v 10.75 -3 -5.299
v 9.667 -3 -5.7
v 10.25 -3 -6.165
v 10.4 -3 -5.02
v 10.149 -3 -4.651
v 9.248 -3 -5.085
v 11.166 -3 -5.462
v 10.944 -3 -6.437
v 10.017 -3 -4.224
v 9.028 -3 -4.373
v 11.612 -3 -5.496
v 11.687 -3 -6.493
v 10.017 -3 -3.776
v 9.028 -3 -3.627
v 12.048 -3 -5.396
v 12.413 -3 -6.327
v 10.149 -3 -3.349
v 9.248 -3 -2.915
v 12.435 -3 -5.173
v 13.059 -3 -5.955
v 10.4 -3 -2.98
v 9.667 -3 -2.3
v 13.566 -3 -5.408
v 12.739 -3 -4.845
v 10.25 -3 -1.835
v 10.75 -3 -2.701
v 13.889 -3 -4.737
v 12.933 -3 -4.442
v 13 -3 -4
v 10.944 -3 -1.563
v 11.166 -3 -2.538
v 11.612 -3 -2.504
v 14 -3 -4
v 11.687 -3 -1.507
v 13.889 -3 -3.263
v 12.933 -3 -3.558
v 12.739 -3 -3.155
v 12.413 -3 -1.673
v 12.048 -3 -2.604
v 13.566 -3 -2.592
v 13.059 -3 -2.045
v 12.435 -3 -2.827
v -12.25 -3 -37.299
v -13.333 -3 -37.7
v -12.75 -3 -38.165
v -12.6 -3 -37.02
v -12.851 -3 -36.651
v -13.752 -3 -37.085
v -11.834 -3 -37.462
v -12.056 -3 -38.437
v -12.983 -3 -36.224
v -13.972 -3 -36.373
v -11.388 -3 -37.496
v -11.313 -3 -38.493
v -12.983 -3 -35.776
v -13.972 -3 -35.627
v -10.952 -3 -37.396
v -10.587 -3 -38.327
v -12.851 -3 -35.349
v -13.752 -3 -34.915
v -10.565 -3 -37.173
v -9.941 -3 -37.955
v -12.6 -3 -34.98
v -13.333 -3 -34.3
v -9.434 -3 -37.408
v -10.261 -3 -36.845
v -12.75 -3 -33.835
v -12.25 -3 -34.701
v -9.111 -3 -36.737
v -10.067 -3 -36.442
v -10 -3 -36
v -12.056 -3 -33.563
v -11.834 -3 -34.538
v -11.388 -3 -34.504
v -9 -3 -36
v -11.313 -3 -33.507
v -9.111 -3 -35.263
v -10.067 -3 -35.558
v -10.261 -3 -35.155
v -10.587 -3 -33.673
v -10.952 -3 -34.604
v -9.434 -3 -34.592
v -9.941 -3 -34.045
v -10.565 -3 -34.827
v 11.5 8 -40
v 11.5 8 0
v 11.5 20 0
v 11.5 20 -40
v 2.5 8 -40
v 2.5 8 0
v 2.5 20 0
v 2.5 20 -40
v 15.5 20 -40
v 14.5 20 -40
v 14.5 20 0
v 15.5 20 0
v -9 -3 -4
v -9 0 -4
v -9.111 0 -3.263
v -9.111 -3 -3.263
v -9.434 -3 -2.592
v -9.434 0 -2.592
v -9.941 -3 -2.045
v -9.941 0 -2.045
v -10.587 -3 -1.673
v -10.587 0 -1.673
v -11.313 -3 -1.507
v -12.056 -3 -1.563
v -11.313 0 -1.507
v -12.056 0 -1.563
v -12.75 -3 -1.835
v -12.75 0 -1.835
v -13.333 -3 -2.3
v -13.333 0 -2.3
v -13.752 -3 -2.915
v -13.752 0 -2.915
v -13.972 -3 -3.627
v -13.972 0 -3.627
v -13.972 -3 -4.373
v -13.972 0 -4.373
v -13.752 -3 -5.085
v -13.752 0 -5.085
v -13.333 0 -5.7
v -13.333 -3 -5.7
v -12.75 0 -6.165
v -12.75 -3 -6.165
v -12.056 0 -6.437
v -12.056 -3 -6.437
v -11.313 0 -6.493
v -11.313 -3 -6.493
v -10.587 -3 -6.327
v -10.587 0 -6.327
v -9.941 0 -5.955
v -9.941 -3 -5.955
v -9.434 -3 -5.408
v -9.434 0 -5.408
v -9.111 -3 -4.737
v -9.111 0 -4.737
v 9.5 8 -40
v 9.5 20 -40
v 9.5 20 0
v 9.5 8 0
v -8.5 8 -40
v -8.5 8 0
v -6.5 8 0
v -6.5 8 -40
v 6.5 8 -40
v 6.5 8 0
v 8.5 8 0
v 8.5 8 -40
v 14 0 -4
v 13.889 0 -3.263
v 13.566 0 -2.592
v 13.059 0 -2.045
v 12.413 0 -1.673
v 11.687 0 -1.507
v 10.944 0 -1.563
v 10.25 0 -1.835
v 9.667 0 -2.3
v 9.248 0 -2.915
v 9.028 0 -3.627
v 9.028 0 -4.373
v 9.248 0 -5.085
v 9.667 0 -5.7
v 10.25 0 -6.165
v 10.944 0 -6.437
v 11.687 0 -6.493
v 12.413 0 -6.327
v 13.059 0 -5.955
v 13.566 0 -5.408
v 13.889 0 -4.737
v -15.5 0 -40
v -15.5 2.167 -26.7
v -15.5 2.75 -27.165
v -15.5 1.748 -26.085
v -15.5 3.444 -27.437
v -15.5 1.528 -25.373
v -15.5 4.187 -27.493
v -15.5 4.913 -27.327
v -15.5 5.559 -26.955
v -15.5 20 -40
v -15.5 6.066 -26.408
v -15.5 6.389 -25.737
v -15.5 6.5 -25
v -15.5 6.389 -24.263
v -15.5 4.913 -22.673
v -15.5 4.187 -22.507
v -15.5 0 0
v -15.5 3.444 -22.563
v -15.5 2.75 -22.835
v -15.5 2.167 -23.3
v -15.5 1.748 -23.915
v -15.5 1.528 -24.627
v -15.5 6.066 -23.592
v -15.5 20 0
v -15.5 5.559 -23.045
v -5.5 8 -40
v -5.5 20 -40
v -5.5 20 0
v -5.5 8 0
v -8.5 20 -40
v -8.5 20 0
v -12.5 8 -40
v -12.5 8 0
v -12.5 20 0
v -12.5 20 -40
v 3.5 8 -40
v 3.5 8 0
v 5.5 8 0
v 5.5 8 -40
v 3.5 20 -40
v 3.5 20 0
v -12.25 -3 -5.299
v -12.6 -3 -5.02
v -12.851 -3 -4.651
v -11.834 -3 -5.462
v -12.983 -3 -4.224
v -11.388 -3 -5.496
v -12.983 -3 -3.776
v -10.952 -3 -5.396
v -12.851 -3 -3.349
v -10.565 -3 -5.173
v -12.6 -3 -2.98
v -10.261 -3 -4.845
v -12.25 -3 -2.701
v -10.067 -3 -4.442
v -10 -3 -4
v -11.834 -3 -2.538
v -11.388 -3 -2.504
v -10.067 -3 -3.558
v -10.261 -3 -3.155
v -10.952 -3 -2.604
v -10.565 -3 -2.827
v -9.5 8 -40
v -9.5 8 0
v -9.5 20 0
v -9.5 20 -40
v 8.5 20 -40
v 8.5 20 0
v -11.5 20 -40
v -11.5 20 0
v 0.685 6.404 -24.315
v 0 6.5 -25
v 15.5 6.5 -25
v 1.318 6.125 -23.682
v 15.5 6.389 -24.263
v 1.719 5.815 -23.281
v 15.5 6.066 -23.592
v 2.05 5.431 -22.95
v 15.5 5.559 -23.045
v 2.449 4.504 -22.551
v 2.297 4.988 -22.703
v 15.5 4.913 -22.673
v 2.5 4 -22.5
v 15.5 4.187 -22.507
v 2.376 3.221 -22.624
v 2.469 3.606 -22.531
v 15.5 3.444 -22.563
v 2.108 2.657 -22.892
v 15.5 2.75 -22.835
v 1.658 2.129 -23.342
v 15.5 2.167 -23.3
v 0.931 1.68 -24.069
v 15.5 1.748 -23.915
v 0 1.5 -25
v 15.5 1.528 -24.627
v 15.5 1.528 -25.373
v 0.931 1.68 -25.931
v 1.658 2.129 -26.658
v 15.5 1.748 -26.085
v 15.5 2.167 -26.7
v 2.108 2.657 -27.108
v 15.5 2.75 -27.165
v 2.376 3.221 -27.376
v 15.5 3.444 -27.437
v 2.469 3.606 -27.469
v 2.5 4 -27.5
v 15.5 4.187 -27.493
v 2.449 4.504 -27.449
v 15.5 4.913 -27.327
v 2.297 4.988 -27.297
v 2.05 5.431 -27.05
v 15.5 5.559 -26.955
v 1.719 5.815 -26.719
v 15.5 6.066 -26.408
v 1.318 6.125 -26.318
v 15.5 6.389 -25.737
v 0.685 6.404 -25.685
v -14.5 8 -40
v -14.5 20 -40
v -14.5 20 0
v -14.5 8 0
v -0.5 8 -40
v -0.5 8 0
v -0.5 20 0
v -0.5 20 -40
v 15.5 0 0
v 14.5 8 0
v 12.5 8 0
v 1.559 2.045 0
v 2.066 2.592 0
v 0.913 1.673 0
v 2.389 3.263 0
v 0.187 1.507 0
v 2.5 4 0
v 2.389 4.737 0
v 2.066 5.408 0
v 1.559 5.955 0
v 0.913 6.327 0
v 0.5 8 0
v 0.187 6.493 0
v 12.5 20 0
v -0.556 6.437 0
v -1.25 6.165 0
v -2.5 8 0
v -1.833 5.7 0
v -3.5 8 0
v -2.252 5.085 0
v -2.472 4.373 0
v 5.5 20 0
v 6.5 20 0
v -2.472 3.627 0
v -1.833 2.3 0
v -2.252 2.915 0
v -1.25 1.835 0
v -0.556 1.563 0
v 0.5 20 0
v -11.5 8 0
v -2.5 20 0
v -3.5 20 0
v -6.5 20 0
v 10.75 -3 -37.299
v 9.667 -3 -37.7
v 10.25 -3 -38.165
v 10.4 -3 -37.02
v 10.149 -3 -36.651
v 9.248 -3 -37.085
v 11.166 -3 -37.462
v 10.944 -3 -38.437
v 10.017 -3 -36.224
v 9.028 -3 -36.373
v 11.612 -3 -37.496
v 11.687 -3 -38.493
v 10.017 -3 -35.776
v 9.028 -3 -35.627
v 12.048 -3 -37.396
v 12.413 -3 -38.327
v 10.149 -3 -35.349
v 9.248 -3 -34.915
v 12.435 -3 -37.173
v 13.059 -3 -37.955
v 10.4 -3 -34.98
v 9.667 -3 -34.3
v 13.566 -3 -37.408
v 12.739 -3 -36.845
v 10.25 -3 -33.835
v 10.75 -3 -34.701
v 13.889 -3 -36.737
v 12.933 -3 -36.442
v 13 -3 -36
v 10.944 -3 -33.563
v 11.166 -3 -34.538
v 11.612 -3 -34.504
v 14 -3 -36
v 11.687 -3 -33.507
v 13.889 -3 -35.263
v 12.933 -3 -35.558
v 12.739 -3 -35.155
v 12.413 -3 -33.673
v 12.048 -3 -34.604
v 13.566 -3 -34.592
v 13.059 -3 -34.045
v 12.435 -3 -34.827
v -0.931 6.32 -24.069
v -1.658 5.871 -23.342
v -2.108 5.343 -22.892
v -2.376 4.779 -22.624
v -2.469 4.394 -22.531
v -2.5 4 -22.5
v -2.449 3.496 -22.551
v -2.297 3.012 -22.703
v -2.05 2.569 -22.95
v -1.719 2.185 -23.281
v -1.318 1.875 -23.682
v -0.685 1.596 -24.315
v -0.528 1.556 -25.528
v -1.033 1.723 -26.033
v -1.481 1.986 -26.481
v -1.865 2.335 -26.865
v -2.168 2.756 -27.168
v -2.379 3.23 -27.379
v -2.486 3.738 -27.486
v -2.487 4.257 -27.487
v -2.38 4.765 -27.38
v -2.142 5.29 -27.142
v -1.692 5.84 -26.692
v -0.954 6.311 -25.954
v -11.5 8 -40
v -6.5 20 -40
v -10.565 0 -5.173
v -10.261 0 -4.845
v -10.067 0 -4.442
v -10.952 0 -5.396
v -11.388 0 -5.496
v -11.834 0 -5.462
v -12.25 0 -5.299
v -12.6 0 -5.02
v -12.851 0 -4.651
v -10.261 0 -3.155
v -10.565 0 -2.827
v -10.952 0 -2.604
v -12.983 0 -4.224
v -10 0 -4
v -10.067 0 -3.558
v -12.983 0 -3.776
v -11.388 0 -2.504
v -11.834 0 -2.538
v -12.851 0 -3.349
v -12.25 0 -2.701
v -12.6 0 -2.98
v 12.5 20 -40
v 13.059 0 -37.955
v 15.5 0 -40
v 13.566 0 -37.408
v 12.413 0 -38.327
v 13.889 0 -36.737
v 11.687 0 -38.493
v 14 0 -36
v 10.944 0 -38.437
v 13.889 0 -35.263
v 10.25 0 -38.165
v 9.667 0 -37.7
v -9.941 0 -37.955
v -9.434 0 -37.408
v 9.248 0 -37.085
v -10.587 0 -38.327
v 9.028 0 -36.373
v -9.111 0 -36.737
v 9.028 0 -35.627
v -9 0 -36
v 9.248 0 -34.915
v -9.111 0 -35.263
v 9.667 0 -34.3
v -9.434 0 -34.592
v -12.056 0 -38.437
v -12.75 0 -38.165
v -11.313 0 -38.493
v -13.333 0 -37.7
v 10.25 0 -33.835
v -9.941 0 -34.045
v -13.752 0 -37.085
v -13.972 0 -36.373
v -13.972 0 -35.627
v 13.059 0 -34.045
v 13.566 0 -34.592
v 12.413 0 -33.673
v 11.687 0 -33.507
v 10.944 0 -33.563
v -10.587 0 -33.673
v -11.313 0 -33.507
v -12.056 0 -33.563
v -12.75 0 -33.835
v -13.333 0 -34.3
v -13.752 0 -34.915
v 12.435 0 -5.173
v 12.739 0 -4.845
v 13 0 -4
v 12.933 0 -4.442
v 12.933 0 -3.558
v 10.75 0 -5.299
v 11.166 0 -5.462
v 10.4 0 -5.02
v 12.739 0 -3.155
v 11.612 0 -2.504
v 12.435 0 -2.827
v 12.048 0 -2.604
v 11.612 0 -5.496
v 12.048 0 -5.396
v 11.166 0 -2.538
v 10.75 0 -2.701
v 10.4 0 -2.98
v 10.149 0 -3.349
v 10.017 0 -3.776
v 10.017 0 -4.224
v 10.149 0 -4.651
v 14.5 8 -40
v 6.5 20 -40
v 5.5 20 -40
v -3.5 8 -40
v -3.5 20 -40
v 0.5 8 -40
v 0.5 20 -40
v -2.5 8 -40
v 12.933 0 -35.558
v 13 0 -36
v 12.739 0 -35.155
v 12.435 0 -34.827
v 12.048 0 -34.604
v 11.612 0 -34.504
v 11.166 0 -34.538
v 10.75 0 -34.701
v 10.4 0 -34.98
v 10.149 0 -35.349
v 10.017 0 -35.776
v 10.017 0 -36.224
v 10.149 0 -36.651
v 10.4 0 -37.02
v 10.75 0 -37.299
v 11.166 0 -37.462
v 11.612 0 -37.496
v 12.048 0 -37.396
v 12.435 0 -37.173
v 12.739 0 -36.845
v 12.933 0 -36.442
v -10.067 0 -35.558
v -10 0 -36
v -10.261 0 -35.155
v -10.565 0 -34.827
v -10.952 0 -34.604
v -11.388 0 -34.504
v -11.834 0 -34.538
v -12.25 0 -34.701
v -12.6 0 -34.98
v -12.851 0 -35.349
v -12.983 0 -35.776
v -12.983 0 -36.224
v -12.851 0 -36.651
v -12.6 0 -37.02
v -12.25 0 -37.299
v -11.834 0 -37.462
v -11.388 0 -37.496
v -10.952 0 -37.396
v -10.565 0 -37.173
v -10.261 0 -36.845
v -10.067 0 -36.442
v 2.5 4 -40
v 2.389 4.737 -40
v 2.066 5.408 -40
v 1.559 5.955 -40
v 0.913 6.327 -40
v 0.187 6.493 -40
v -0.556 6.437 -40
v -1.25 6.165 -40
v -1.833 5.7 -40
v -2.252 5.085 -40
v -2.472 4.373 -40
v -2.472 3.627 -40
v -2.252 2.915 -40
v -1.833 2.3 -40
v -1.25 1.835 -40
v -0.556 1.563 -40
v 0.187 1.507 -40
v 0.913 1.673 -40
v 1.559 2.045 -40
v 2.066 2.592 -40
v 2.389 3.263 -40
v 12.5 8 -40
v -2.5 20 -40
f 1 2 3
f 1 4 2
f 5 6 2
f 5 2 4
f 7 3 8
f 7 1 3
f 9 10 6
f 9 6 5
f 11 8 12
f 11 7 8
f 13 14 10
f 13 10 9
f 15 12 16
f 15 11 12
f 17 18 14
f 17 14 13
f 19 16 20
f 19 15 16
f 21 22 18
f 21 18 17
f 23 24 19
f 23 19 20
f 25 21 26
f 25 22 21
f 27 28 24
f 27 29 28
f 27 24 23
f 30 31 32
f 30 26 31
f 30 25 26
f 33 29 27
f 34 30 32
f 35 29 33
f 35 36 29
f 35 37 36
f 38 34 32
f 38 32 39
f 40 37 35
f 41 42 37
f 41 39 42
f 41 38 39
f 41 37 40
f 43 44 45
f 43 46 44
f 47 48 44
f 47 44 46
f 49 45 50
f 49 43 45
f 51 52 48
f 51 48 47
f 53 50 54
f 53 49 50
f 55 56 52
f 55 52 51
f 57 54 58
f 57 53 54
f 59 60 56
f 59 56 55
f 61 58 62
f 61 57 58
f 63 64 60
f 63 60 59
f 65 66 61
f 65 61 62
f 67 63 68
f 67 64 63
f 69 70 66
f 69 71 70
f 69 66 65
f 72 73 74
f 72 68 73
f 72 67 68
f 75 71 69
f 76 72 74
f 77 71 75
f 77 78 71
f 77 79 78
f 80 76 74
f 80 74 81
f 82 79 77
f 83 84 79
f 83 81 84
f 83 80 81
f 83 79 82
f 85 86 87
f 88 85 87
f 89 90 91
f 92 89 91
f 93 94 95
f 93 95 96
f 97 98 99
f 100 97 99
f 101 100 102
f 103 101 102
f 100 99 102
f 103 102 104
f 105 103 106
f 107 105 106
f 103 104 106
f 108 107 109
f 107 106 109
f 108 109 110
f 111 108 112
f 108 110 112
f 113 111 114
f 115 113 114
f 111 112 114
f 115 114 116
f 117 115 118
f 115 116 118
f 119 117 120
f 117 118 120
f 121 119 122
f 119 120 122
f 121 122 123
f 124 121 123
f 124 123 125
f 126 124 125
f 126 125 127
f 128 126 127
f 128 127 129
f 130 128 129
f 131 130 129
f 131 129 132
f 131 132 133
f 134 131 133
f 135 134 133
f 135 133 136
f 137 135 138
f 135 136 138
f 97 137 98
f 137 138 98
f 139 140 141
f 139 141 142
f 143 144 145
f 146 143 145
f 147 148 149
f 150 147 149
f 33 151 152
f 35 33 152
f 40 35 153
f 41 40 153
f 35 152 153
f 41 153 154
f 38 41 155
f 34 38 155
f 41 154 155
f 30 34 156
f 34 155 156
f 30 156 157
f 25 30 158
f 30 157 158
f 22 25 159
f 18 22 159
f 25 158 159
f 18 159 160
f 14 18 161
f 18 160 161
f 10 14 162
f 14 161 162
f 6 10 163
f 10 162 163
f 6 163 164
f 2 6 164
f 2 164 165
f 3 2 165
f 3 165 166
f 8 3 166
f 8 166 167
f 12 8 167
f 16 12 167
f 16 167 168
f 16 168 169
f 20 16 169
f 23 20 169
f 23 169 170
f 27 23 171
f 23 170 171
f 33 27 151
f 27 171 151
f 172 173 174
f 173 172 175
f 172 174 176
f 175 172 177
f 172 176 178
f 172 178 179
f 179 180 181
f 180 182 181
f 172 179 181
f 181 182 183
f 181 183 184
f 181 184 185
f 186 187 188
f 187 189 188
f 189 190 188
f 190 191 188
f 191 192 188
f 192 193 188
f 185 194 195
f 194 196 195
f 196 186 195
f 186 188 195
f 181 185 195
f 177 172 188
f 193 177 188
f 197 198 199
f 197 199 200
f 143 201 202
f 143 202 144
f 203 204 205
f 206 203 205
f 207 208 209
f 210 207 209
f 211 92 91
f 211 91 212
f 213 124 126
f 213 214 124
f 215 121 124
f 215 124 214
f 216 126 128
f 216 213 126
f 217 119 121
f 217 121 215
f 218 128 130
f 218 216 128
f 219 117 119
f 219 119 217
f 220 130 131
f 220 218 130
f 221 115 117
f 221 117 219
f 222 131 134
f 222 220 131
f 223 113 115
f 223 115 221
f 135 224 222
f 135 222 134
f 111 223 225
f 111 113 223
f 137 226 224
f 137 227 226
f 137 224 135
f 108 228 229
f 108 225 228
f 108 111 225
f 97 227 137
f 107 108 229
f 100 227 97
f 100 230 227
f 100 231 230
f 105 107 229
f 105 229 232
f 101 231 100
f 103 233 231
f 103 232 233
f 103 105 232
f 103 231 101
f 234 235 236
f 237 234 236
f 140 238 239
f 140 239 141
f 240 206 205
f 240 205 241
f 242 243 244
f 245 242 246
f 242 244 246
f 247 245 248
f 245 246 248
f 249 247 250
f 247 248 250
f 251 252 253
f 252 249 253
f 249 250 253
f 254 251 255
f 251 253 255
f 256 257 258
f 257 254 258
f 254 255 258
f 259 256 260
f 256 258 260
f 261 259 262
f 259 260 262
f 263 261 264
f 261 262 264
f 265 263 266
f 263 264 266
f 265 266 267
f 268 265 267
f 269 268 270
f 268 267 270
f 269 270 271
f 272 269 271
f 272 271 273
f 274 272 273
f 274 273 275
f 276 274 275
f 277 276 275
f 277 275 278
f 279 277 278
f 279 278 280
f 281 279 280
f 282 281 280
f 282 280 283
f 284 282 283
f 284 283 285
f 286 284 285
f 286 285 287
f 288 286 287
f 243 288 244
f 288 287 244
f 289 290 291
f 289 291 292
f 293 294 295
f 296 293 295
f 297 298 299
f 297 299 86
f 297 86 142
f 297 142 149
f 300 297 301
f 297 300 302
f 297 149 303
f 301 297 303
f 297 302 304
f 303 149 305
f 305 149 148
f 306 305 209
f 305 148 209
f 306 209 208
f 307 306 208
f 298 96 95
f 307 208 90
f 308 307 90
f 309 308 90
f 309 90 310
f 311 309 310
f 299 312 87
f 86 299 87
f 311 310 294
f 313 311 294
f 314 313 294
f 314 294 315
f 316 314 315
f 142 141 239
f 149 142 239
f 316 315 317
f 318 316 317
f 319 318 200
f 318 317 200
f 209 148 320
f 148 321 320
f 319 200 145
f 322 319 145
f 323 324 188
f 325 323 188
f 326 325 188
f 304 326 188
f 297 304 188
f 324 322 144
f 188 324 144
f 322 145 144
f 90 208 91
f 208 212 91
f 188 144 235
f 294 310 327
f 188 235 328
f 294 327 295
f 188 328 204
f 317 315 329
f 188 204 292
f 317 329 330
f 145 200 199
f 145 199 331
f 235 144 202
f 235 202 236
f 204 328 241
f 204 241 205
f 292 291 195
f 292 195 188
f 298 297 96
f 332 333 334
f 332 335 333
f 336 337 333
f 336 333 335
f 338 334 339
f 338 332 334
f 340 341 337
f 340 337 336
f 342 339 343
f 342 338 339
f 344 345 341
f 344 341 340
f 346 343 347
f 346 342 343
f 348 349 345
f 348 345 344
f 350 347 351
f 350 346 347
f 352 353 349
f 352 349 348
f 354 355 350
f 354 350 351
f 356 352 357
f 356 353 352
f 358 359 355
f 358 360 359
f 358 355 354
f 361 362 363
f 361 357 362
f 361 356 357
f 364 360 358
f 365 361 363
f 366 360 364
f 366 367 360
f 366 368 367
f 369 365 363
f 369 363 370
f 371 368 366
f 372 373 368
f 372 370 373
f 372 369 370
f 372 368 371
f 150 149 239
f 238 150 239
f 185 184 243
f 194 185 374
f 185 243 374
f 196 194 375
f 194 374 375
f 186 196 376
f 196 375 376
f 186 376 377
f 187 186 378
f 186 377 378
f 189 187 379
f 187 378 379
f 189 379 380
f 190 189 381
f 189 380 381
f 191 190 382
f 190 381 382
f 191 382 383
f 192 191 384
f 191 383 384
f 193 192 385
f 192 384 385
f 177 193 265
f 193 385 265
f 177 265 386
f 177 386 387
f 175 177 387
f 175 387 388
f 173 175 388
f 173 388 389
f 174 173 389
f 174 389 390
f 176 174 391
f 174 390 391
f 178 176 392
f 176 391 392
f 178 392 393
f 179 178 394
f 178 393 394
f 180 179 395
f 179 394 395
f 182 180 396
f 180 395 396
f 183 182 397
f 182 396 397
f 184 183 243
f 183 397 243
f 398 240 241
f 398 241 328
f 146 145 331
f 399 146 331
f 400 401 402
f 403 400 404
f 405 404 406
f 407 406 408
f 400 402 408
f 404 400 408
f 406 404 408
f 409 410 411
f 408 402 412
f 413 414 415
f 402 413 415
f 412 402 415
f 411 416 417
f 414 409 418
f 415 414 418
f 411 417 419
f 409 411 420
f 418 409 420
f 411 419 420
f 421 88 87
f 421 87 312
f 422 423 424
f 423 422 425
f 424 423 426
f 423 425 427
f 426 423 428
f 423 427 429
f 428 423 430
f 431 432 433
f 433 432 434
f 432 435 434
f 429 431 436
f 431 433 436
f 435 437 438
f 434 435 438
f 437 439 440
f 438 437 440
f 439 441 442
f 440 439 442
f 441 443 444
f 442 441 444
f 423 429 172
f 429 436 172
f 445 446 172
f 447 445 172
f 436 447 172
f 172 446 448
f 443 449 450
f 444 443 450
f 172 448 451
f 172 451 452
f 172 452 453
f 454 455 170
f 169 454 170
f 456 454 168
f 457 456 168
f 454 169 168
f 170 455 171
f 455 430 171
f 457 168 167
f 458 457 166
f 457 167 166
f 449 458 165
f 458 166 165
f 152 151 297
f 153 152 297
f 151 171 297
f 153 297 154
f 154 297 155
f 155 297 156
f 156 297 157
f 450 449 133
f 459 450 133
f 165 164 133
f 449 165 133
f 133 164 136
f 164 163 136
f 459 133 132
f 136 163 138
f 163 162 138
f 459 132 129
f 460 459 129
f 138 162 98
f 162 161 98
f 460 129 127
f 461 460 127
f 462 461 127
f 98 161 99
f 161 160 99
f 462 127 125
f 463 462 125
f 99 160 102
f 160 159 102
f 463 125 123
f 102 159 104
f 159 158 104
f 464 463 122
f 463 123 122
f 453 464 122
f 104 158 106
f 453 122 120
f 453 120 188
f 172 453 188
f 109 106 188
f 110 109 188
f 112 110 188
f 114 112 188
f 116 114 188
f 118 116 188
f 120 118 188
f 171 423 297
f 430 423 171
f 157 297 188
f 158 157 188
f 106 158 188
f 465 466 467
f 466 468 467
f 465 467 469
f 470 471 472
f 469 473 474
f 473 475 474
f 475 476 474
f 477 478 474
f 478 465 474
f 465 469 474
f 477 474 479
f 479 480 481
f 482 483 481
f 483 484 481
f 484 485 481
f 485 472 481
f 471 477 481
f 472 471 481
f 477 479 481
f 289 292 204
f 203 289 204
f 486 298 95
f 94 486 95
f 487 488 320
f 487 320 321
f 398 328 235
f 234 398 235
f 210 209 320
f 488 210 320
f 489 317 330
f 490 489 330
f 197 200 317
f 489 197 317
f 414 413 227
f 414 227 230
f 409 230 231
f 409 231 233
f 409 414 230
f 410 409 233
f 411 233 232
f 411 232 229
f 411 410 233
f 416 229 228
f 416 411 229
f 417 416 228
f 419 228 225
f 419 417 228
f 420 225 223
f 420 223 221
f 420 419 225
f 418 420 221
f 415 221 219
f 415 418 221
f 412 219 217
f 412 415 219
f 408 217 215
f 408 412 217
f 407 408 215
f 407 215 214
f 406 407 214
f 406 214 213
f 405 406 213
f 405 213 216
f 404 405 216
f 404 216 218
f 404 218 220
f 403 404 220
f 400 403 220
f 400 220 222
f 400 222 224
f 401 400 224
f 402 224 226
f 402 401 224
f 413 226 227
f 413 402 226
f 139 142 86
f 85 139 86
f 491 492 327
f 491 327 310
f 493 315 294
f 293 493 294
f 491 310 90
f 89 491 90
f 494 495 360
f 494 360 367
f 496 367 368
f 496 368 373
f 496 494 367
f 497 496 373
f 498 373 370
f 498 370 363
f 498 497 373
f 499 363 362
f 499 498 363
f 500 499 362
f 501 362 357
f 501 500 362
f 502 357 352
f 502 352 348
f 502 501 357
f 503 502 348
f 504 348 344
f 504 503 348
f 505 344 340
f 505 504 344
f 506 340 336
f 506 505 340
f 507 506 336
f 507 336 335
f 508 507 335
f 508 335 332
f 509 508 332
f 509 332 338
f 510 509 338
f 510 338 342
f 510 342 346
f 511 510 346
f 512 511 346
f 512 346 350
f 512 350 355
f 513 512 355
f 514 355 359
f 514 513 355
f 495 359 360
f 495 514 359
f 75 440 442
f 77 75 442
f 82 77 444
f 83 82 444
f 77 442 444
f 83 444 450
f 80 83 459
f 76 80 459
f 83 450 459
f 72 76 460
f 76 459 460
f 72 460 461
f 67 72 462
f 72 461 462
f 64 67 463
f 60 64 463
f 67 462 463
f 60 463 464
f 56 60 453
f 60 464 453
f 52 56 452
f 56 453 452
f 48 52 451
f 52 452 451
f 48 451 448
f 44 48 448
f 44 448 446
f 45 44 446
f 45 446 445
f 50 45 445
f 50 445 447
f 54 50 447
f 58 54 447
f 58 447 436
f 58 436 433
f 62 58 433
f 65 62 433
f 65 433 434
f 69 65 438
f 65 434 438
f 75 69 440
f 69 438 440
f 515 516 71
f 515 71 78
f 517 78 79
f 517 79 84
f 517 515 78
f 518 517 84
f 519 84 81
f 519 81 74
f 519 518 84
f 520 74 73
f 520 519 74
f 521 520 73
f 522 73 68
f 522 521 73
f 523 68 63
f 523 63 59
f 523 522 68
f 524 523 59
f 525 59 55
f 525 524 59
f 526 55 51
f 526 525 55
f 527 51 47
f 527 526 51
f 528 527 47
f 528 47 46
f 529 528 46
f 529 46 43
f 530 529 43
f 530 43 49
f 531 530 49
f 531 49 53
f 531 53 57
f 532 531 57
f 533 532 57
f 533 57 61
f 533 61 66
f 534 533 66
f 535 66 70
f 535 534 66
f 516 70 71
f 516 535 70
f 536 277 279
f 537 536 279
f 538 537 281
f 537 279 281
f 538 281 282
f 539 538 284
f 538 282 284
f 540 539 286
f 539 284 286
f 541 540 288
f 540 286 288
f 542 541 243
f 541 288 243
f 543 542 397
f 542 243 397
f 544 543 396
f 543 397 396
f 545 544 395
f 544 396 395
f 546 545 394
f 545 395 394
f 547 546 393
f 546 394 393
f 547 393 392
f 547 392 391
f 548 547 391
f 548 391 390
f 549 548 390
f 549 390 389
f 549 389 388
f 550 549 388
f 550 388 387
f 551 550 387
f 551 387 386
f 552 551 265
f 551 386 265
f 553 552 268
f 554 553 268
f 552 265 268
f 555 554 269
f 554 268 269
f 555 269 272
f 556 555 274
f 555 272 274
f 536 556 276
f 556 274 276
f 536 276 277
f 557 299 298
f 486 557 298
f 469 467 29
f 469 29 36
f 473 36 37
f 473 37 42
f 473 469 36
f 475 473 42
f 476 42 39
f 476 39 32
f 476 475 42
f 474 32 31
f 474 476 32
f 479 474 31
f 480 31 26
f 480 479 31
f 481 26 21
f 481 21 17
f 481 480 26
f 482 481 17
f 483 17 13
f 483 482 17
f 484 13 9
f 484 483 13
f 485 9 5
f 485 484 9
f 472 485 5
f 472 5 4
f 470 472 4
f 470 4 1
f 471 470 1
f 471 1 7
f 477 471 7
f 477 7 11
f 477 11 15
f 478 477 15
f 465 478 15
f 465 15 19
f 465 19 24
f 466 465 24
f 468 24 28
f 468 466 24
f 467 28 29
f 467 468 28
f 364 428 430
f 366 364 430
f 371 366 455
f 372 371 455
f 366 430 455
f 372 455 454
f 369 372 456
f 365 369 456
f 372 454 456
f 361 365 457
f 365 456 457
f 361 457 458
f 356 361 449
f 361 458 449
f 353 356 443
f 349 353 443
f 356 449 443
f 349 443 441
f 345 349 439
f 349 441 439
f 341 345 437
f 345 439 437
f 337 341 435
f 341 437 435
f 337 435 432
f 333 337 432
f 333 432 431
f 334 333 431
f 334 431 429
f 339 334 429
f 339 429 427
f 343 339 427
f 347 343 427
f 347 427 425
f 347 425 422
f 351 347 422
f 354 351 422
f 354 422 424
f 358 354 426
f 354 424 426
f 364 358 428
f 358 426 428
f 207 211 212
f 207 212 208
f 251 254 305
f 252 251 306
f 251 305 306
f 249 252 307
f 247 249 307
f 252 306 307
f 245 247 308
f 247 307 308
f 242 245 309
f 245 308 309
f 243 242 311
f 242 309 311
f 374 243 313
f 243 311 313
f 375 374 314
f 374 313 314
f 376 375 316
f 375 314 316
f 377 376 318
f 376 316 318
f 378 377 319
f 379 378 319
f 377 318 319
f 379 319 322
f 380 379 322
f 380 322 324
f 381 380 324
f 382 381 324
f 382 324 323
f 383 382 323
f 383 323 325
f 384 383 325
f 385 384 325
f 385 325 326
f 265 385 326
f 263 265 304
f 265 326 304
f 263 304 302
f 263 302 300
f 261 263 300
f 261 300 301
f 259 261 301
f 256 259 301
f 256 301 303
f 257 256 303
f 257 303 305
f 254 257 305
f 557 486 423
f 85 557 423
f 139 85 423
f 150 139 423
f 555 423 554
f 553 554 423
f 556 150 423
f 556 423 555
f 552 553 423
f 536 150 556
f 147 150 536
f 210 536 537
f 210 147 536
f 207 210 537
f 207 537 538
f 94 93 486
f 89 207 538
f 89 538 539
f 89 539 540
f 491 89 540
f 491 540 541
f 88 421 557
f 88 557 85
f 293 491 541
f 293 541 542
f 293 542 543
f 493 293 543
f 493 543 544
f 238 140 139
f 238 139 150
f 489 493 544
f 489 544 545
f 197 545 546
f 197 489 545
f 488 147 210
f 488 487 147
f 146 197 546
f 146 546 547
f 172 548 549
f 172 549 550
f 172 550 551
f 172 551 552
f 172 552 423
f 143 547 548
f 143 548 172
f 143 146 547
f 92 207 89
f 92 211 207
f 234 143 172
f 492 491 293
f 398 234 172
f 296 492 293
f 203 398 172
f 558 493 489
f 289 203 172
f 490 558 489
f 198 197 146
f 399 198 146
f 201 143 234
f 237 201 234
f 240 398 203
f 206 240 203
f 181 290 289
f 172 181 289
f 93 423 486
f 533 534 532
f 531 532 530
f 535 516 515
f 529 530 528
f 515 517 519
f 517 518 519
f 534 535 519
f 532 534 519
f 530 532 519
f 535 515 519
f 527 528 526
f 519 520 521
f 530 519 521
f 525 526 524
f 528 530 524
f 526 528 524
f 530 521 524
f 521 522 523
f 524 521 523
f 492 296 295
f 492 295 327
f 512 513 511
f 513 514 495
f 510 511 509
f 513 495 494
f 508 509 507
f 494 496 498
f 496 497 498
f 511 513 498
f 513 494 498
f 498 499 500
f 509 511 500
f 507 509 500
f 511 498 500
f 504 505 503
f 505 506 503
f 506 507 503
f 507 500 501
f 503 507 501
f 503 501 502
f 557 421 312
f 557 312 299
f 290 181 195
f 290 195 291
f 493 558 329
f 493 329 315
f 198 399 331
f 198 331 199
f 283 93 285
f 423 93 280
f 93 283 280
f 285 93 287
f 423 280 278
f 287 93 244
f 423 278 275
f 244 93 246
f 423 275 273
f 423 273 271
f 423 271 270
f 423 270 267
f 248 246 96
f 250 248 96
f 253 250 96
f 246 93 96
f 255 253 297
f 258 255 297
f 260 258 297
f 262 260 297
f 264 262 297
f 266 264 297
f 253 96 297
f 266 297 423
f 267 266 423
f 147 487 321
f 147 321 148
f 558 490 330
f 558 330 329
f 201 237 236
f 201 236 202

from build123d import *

# Parameters (mm, degrees)
EXTRUDE1_DEPTH       = 40
SKETCH2_R            = 2.5
EXTRUDE2_DEPTH       = 48.331279298
SKETCH3_R            = 2.5
EXTRUDE3_DEPTH       = 55.415071442
SKETCH4_R            = 2.5
SKETCH4_R_2          = 1.5
EXTRUDE4_DEPTH       = 3
LPATTERN6_COUNT      = 2
LPATTERN6_PITCH      = 23
LPATTERN6_COUNT_DIR2 = 2
LPATTERN6_PITCH_DIR2 = 32


with BuildPart() as part:
    # Sketch1 → Extrude1 (new body)
    with BuildSketch(Plane.XY):
        Polygon((-15.5, 0), (-15.5, 20), (-14.5, 20), (-14.5, 8), (-12.5, 8), (-12.5, 20), (-11.5, 20), (-11.5, 8), (-9.5, 8), (-9.5, 20), (-8.5, 20), (-8.5, 8), (-6.5, 8), (-6.5, 20), (-5.5, 20), (-5.5, 8), (-3.5, 8), (-3.5, 20), (-2.5, 20), (-2.5, 8), (-0.5, 8), (-0.5, 20), (0.5, 20), (0.5, 8), (2.5, 8), (2.5, 20), (3.5, 20), (3.5, 8), (5.5, 8), (5.5, 20), (6.5, 20), (6.5, 8), (8.5, 8), (8.5, 20), (9.5, 20), (9.5, 8), (11.5, 8), (11.5, 20), (12.5, 20), (12.5, 8), (14.5, 8), (14.5, 20), (15.5, 20), (15.5, 0), align=None)
    extrude(amount=-EXTRUDE1_DEPTH)

    # Sketch2 → Extrude2 (cut, through all)
    with BuildSketch(Plane.XY):
        with Locations((0, 4)):
            Circle(SKETCH2_R)
    extrude(amount=-EXTRUDE2_DEPTH, mode=Mode.SUBTRACT)

    # Sketch3 → Extrude3 (cut, through all)
    with BuildSketch(Plane(origin=(15.5, 0, 0), x_dir=(0, 0, -1), z_dir=(1, 0, 0))):
        with Locations(Location((25, 4, 0), (0, 0, 90))):
            Circle(SKETCH3_R)
    extrude(amount=-EXTRUDE3_DEPTH, mode=Mode.SUBTRACT)

    # Sketch4 → Extrude4 (add)
    with BuildSketch(Plane.XZ):
        with Locations((11.5, -4)):
            Circle(SKETCH4_R)
        with Locations((11.5, -4)):
            Circle(SKETCH4_R_2, mode=Mode.SUBTRACT)
    extrude4 = extrude(amount=EXTRUDE4_DEPTH)

    # LPattern6: Extrude4 2 × 2
    with Locations(*[(-i * LPATTERN6_PITCH, 0, -j * LPATTERN6_PITCH_DIR2) for i in range(LPATTERN6_COUNT) for j in range(LPATTERN6_COUNT_DIR2) if (i, j) != (0, 0)]):
        add(extrude4)


solid = part.part
